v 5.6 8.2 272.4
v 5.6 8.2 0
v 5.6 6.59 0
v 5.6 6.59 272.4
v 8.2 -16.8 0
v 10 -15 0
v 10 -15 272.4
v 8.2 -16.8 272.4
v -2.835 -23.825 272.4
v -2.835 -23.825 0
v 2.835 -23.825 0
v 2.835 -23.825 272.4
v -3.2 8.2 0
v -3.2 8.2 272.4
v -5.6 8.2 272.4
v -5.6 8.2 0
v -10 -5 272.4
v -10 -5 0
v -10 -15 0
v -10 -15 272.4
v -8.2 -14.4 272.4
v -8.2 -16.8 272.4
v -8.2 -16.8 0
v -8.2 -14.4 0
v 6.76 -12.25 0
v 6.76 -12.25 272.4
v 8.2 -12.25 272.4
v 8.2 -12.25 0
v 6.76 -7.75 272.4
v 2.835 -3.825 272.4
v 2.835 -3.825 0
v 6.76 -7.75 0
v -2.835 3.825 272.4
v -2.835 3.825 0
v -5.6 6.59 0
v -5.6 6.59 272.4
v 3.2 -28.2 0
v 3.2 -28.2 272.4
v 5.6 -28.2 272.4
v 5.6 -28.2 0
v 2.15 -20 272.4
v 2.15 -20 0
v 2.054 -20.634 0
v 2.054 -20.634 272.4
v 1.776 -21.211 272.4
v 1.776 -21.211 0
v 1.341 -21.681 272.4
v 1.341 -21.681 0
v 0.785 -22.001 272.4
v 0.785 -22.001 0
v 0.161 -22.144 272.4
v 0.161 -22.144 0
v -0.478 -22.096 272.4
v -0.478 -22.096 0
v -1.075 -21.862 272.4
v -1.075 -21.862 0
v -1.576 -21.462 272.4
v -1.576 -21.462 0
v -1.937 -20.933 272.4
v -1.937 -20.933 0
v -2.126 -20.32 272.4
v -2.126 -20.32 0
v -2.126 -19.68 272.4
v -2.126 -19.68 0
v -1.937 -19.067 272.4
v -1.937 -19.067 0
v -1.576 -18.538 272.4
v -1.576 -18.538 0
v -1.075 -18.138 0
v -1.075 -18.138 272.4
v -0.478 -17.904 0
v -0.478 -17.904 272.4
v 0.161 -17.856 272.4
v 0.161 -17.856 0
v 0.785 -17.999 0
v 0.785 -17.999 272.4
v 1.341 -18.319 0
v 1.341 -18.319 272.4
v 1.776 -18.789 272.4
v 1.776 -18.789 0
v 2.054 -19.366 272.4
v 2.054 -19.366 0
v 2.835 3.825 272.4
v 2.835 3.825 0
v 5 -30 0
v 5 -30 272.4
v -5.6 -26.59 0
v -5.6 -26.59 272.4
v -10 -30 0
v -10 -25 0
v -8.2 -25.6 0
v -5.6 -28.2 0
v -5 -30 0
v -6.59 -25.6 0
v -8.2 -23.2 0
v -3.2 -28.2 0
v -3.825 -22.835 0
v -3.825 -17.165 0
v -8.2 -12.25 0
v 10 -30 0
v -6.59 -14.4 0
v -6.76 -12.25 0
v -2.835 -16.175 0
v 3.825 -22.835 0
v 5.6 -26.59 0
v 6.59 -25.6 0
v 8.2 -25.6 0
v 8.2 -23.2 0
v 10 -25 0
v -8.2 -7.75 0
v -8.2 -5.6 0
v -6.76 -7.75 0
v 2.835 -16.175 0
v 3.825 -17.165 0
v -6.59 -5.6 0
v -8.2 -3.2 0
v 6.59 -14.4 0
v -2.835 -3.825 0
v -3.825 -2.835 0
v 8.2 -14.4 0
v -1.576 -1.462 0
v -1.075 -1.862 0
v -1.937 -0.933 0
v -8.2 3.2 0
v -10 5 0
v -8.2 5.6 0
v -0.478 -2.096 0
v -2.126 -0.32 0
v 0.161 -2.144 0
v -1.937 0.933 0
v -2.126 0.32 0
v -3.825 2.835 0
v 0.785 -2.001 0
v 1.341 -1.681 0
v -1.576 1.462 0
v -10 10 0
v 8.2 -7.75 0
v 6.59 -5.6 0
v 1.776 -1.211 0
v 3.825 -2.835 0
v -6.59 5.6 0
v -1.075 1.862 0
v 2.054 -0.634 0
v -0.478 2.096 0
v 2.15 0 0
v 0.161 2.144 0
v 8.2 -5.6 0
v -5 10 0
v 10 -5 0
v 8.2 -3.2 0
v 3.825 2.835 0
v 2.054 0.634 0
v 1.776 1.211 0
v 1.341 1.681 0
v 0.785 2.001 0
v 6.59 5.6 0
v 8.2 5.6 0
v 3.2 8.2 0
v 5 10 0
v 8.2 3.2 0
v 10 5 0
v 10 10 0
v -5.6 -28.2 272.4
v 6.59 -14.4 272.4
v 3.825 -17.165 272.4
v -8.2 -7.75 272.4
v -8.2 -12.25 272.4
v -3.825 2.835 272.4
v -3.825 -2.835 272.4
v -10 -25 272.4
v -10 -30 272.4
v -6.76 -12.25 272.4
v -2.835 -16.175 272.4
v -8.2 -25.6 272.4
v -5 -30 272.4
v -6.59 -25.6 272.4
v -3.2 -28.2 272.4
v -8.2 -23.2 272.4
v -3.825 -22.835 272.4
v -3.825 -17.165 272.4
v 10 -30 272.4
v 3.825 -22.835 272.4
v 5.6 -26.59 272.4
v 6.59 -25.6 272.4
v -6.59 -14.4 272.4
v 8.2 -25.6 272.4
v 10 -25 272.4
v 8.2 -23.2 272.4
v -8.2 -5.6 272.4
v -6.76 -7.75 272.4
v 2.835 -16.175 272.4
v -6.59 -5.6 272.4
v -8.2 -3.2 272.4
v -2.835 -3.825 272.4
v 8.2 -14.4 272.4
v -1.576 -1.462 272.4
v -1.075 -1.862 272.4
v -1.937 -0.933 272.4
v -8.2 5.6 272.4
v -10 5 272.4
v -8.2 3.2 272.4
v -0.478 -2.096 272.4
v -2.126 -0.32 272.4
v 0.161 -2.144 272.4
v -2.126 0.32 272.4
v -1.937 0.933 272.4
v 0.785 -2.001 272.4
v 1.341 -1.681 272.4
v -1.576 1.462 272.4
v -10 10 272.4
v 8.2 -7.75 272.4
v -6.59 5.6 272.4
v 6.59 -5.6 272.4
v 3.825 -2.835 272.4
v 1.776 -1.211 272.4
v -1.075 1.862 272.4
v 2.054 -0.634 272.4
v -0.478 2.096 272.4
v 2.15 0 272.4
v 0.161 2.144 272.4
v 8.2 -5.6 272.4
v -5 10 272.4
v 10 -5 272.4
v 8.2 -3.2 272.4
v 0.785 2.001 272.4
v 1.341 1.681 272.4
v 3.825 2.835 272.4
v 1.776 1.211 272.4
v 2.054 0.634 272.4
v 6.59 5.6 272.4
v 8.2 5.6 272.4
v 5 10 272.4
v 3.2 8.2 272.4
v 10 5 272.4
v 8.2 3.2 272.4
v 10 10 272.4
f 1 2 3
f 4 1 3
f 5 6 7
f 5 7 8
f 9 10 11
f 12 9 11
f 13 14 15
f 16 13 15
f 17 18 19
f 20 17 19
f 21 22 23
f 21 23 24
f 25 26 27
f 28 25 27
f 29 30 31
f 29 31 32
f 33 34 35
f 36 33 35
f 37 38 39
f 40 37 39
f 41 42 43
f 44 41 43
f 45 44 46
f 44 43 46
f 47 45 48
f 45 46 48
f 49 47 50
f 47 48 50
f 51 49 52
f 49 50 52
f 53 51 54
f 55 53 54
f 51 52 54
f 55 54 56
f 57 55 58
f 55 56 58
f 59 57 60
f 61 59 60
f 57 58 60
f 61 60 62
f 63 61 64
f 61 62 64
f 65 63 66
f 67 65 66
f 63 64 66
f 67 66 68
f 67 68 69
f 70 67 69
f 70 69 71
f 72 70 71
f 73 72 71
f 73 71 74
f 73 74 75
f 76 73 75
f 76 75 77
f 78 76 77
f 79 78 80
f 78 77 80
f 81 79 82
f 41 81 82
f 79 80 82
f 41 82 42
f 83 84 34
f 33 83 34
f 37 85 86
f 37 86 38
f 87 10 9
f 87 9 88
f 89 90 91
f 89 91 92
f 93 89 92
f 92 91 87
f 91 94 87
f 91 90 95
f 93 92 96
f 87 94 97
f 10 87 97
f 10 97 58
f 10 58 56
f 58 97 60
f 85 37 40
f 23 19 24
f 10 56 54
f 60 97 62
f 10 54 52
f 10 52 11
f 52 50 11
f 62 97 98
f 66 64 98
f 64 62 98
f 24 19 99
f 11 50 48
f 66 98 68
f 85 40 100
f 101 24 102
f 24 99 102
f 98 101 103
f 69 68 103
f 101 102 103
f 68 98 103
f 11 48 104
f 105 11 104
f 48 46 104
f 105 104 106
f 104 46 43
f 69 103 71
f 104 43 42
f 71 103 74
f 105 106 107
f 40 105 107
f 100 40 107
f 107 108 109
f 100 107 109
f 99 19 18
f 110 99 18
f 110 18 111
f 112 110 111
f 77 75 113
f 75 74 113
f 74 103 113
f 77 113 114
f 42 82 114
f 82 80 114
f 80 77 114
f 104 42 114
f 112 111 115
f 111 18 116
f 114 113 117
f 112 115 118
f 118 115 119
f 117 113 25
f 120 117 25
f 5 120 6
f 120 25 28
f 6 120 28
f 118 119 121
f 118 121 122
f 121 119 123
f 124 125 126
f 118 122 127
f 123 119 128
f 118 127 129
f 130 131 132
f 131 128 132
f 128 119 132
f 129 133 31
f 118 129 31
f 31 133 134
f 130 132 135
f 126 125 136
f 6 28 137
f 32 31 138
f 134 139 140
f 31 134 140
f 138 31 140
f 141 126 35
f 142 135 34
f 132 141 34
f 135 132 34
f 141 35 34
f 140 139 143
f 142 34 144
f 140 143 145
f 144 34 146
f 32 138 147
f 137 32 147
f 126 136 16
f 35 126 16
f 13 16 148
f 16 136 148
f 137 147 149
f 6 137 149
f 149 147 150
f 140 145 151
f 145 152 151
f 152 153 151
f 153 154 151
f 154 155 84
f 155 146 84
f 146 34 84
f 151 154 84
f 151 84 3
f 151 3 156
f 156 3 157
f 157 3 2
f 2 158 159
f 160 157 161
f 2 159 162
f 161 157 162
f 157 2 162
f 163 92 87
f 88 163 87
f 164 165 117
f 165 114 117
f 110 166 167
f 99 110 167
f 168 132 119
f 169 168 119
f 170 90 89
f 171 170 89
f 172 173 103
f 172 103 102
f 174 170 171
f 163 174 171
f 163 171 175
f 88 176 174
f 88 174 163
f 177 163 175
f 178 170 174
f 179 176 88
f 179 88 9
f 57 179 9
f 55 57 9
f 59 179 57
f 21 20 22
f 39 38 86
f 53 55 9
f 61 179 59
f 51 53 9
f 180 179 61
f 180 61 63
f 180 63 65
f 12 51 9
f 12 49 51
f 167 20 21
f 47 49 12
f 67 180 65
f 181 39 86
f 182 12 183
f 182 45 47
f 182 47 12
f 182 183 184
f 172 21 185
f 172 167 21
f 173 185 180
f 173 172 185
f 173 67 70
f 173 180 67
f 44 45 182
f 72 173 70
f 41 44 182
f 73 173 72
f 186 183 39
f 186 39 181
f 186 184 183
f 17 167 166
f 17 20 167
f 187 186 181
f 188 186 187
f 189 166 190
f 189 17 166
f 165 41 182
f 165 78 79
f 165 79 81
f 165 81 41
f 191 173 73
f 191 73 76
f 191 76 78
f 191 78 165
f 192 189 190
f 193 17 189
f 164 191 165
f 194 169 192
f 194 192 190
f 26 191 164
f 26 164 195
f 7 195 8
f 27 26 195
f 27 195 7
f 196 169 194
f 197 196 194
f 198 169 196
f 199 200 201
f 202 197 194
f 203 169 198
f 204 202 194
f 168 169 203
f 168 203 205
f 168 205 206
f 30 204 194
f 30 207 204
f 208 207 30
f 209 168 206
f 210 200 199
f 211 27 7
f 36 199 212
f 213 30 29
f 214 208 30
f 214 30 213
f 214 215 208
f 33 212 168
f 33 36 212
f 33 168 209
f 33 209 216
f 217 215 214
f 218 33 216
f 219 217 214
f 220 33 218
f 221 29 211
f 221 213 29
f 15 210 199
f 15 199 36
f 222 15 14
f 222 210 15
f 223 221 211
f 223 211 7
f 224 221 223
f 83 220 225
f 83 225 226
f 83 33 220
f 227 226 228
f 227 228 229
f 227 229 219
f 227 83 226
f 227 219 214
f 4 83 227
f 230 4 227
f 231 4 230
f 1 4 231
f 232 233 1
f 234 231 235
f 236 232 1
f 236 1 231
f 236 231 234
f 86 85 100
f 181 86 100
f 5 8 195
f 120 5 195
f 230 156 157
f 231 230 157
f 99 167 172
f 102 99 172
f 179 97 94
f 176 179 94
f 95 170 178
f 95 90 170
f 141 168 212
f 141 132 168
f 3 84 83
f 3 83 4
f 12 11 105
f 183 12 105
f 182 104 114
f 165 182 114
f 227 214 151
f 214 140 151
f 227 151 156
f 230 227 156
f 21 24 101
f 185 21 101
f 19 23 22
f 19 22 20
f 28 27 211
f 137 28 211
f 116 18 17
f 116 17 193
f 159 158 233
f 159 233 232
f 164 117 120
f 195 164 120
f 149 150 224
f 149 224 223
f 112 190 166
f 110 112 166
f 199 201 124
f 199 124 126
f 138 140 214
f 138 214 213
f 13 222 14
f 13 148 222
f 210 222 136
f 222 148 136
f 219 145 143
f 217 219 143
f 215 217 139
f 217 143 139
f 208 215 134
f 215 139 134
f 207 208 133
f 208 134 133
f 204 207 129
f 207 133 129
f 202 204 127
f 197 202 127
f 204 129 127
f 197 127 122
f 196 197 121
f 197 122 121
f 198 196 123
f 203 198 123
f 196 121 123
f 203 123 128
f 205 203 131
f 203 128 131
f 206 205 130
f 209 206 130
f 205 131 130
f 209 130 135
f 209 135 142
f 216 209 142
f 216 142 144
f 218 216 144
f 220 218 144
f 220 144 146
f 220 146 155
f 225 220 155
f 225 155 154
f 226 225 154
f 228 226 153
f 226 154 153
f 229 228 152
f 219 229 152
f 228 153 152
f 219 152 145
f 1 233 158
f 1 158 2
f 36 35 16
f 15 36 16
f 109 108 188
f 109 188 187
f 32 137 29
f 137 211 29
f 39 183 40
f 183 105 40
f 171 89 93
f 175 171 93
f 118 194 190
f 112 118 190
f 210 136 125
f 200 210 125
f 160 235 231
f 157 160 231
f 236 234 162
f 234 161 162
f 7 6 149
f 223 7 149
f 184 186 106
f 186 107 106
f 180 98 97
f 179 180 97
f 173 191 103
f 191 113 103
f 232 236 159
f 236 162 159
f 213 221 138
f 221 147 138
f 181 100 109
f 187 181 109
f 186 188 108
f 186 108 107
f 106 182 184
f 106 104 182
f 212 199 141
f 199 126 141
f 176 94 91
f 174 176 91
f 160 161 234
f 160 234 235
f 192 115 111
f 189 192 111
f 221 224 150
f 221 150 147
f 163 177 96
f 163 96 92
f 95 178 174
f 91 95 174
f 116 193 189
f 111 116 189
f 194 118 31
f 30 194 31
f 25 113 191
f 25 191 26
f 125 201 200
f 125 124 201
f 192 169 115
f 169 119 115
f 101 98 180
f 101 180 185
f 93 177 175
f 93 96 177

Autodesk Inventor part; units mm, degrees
ref_plane "YZ Plane" through (0, 0, 0) normal (1, 0, 0) x (0, 1, 0)
ref_plane "XZ Plane" through (0, 0, 0) normal (0, 1, 0) x (-1, 0, 0)
ref_plane "XY Plane" through (0, 0, 0) normal (0, 0, 1) x (1, 0, 0)
sketch "Sketch1" plane through (0, 0, 0) normal (0, 0, 1) x (1, 0, 0)
  line L0 (-10, -10) -> (-5.6, -10)
  line L1 (-10, -5.6) -> (-10, -10)
  line L2 (-5.6, -10) -> (-5, -10)
  line L3 (-3.2, -8.2) -> (-5.6, -8.2)
  line L4 (-2.8351, -3.825) -> (-5.6, -6.5899)
  line L5 (-3.825, -2.8351) -> (-6.5899, -5.6)
  line L6 (0, 0) -> (0, -11) construction
  line L7 (0, 0) -> (-12, 0) construction
  line L8 (-3.2, -8.2) -> (-5, -10)
  line L9 (-6.5899, -5.6) -> (-8.2, -5.6)
  line L10 (-10, -5.6) -> (-10, -5)
  line L11 (-10, -5) -> (-8.2, -3.2)
  line L12 (-8.2, -3.2) -> (-8.2, -5.6)
  line L13 (-5.6, -8.2) -> (-5.6, -6.5899)
  arc A0 (-2.15, 0) -> (0, -2.15) centre (0, 0) ccw
  line L14 (0, 0) -> (-3.825, 0)
  line L15 (-3.825, 0) -> (-3.825, -2.8351)
  line L16 (-2.8351, -3.825) -> (0, -3.825)
  line L17 (0, -3.825) -> (0, 0)
  line L18 (-2.8351, -3.825) -> (-3.825, -3.825) construction
  line L19 (-3.825, -3.825) -> (-3.825, -2.8351) construction
  line L20 (3.825, -2.8351) -> (3.825, -3.825) construction
  line L21 (3.825, -2.8351) -> (3.825, 0)
  line L22 (3.825, -3.825) -> (2.8351, -3.825) construction
  line L23 (3.825, 0) -> (0, 0)
  line L24 (0, -3.825) -> (2.8351, -3.825)
  arc A1 (0, -2.15) -> (2.15, 0) centre (0, 0) ccw
  line L25 (0, 0) -> (0, -3.825)
  line L26 (2.8351, -3.825) -> (5.6, -6.5899)
  line L27 (0, 0) -> (0, -12) construction
  line L28 (0, 0) -> (11, 0) construction
  line L29 (3.825, -2.8351) -> (6.5899, -5.6)
  line L30 (8.2, -3.2) -> (8.2, -5.6)
  line L31 (10, -5.6) -> (10, -5)
  line L32 (8.2, -3.2) -> (10, -5)
  line L33 (8.2, -5.6) -> (6.5899, -5.6)
  line L34 (5.6, -6.5899) -> (5.6, -8.2)
  line L35 (10, -10) -> (10, -5.6)
  line L36 (5.6, -10) -> (10, -10)
  line L37 (3.2, -8.2) -> (5.6, -8.2)
  line L38 (5, -10) -> (3.2, -8.2)
  line L39 (5.6, -10) -> (5, -10)
  line L40 (2.8351, 3.825) -> (3.825, 3.825) construction
  line L41 (2.8351, 3.825) -> (0, 3.825)
  line L42 (3.825, 3.825) -> (3.825, 2.8351) construction
  line L43 (0, 3.825) -> (0, 0)
  line L44 (3.825, 0) -> (3.825, 2.8351)
  arc A2 (2.15, 0) -> (0, 2.15) centre (0, 0) ccw
  line L45 (0, 0) -> (3.825, 0)
  line L46 (3.825, 2.8351) -> (6.5899, 5.6)
  line L47 (0, 0) -> (12, 0) construction
  line L48 (0, 0) -> (0, 11) construction
  line L49 (2.8351, 3.825) -> (5.6, 6.5899)
  line L50 (3.2, 8.2) -> (5.6, 8.2)
  line L51 (5.6, 10) -> (5, 10)
  line L52 (3.2, 8.2) -> (5, 10)
  line L53 (5.6, 8.2) -> (5.6, 6.5899)
  line L54 (6.5899, 5.6) -> (8.2, 5.6)
  line L55 (10, 10) -> (5.6, 10)
  line L56 (10, 5.6) -> (10, 10)
  line L57 (8.2, 3.2) -> (8.2, 5.6)
  line L58 (10, 5) -> (8.2, 3.2)
  line L59 (10, 5.6) -> (10, 5)
  line L60 (-3.825, 2.8351) -> (-3.825, 3.825) construction
  line L61 (-3.825, 2.8351) -> (-3.825, 0)
  line L62 (-3.825, 3.825) -> (-2.8351, 3.825) construction
  line L63 (-3.825, 0) -> (0, 0)
  line L64 (0, 3.825) -> (-2.8351, 3.825)
  arc A3 (0, 2.15) -> (-2.15, 0) centre (0, 0) ccw
  line L65 (0, 0) -> (0, 3.825)
  line L66 (-2.8351, 3.825) -> (-5.6, 6.5899)
  line L67 (0, 0) -> (0, 12) construction
  line L68 (0, 0) -> (-11, 0) construction
  line L69 (-3.825, 2.8351) -> (-6.5899, 5.6)
  line L70 (-8.2, 3.2) -> (-8.2, 5.6)
  line L71 (-10, 5.6) -> (-10, 5)
  line L72 (-8.2, 3.2) -> (-10, 5)
  line L73 (-8.2, 5.6) -> (-6.5899, 5.6)
  line L74 (-5.6, 6.5899) -> (-5.6, 8.2)
  line L75 (-10, 10) -> (-10, 5.6)
  line L76 (-5.6, 10) -> (-10, 10)
  line L77 (-3.2, 8.2) -> (-5.6, 8.2)
  line L78 (-5, 10) -> (-3.2, 8.2)
  line L79 (-5.6, 10) -> (-5, 10)
  point P0 (0, 2.15)
  point P1 (2.15, 0)
  point P2 (0, -2.15)
  dimension "d16" = 10
  dimension "d19" = 3.2
  dimension "d21" = 4.4
  dimension "d22" = 4.4
  dimension "d24" = 45
  dimension "d25" = 1.8
  dimension "d27" = 1.8
  dimension "d28" = 45
  dimension "d29" = 3.2
  dimension "d31" = 1.4
  dimension "d33" = 2.15
  dimension "d34" = 3.825
  dimension "d35" = 3.825
  dimension "d36" = 135
  dimension "d39" = 360
extrude "ExtrusionModifier" add sketch "Sketch1" along normal blind 272.4 contours L1 L10 L11 L12 L9 L5 L15 L14 A0 L17 L16 L4 L13 L3 L8 L2 L0 | L17 A1 L23 L21 L29 L33 L30 L32 L31 L35 L36 L39 L38 L37 L34 L26 L24 | L61 L69 L73 L70 L72 L71 L75 L76 L79 L78 L77 L74 L66 L64 L43 A3 L14 | A2 L43 L41 L49 L53 L50 L52 L51 L55 L56 L59 L58 L57 L54 L46 L44 L23
pattern_linear "Rectangular Pattern1" count 2 spacing 20 along (0, -1, 0) of "ExtrusionModifier"
sketch "Sketch2" plane through (0, 0, 272.4) normal (0, 0, 1) x (1, 0, 0)
  line L0 (3.2, -8.2) -> (5, -10) projected
  line L1 (-3.2, -11.8) -> (-5, -10) projected
  line L2 (5, -10) -> (-5, -10) construction
  line L3 (-8.2, -12.25) -> (8.2, -12.25)
  line L4 (8.2, -12.25) -> (8.2, -7.75)
  line L5 (8.2, -7.75) -> (-8.2, -7.75)
  line L6 (-8.2, -7.75) -> (-8.2, -12.25)
  line L7 (-8.2, -12.25) -> (8.2, -7.75) construction
  line L8 (8.2, -12.25) -> (-8.2, -7.75) construction
  line L9 (10, -15) -> (10, -5) projected
  line L10 (5.6, -6.5899) -> (5.6, -8.2) projected
  line L11 (5.6, -6.5899) -> (6.7601, -7.75)
  line L12 (-5.6, -6.5899) -> (-2.8351, -3.825) projected
  line L13 (-5.6, -6.5899) -> (-6.7601, -7.75)
  line L14 (5.6, -13.4101) -> (6.7601, -12.25)
  line L15 (-5.6, -13.4101) -> (-6.7601, -12.25)
  line L16 (-5.6, -6.5899) -> (-5.6, -7.75)
  line L17 (-5.6, -8.2) -> (-5.6, -6.5899) projected
  line L18 (5.6, -6.5899) -> (5.6, -7.75)
  line L19 (-5.6, -11.8) -> (-5.6, -13.4101)
  line L20 (5.6, -13.4101) -> (5.6, -12.25)
  point P0 (0, 0)
  point P1 (0, -10)
  point P2 (-5.6, -12.25)
  dimension "d46" = 4.5
  dimension "d50" = 1.8
extrude "NoEdit" cut sketch "Sketch2" against normal through all
properties part number "AP20x20"
